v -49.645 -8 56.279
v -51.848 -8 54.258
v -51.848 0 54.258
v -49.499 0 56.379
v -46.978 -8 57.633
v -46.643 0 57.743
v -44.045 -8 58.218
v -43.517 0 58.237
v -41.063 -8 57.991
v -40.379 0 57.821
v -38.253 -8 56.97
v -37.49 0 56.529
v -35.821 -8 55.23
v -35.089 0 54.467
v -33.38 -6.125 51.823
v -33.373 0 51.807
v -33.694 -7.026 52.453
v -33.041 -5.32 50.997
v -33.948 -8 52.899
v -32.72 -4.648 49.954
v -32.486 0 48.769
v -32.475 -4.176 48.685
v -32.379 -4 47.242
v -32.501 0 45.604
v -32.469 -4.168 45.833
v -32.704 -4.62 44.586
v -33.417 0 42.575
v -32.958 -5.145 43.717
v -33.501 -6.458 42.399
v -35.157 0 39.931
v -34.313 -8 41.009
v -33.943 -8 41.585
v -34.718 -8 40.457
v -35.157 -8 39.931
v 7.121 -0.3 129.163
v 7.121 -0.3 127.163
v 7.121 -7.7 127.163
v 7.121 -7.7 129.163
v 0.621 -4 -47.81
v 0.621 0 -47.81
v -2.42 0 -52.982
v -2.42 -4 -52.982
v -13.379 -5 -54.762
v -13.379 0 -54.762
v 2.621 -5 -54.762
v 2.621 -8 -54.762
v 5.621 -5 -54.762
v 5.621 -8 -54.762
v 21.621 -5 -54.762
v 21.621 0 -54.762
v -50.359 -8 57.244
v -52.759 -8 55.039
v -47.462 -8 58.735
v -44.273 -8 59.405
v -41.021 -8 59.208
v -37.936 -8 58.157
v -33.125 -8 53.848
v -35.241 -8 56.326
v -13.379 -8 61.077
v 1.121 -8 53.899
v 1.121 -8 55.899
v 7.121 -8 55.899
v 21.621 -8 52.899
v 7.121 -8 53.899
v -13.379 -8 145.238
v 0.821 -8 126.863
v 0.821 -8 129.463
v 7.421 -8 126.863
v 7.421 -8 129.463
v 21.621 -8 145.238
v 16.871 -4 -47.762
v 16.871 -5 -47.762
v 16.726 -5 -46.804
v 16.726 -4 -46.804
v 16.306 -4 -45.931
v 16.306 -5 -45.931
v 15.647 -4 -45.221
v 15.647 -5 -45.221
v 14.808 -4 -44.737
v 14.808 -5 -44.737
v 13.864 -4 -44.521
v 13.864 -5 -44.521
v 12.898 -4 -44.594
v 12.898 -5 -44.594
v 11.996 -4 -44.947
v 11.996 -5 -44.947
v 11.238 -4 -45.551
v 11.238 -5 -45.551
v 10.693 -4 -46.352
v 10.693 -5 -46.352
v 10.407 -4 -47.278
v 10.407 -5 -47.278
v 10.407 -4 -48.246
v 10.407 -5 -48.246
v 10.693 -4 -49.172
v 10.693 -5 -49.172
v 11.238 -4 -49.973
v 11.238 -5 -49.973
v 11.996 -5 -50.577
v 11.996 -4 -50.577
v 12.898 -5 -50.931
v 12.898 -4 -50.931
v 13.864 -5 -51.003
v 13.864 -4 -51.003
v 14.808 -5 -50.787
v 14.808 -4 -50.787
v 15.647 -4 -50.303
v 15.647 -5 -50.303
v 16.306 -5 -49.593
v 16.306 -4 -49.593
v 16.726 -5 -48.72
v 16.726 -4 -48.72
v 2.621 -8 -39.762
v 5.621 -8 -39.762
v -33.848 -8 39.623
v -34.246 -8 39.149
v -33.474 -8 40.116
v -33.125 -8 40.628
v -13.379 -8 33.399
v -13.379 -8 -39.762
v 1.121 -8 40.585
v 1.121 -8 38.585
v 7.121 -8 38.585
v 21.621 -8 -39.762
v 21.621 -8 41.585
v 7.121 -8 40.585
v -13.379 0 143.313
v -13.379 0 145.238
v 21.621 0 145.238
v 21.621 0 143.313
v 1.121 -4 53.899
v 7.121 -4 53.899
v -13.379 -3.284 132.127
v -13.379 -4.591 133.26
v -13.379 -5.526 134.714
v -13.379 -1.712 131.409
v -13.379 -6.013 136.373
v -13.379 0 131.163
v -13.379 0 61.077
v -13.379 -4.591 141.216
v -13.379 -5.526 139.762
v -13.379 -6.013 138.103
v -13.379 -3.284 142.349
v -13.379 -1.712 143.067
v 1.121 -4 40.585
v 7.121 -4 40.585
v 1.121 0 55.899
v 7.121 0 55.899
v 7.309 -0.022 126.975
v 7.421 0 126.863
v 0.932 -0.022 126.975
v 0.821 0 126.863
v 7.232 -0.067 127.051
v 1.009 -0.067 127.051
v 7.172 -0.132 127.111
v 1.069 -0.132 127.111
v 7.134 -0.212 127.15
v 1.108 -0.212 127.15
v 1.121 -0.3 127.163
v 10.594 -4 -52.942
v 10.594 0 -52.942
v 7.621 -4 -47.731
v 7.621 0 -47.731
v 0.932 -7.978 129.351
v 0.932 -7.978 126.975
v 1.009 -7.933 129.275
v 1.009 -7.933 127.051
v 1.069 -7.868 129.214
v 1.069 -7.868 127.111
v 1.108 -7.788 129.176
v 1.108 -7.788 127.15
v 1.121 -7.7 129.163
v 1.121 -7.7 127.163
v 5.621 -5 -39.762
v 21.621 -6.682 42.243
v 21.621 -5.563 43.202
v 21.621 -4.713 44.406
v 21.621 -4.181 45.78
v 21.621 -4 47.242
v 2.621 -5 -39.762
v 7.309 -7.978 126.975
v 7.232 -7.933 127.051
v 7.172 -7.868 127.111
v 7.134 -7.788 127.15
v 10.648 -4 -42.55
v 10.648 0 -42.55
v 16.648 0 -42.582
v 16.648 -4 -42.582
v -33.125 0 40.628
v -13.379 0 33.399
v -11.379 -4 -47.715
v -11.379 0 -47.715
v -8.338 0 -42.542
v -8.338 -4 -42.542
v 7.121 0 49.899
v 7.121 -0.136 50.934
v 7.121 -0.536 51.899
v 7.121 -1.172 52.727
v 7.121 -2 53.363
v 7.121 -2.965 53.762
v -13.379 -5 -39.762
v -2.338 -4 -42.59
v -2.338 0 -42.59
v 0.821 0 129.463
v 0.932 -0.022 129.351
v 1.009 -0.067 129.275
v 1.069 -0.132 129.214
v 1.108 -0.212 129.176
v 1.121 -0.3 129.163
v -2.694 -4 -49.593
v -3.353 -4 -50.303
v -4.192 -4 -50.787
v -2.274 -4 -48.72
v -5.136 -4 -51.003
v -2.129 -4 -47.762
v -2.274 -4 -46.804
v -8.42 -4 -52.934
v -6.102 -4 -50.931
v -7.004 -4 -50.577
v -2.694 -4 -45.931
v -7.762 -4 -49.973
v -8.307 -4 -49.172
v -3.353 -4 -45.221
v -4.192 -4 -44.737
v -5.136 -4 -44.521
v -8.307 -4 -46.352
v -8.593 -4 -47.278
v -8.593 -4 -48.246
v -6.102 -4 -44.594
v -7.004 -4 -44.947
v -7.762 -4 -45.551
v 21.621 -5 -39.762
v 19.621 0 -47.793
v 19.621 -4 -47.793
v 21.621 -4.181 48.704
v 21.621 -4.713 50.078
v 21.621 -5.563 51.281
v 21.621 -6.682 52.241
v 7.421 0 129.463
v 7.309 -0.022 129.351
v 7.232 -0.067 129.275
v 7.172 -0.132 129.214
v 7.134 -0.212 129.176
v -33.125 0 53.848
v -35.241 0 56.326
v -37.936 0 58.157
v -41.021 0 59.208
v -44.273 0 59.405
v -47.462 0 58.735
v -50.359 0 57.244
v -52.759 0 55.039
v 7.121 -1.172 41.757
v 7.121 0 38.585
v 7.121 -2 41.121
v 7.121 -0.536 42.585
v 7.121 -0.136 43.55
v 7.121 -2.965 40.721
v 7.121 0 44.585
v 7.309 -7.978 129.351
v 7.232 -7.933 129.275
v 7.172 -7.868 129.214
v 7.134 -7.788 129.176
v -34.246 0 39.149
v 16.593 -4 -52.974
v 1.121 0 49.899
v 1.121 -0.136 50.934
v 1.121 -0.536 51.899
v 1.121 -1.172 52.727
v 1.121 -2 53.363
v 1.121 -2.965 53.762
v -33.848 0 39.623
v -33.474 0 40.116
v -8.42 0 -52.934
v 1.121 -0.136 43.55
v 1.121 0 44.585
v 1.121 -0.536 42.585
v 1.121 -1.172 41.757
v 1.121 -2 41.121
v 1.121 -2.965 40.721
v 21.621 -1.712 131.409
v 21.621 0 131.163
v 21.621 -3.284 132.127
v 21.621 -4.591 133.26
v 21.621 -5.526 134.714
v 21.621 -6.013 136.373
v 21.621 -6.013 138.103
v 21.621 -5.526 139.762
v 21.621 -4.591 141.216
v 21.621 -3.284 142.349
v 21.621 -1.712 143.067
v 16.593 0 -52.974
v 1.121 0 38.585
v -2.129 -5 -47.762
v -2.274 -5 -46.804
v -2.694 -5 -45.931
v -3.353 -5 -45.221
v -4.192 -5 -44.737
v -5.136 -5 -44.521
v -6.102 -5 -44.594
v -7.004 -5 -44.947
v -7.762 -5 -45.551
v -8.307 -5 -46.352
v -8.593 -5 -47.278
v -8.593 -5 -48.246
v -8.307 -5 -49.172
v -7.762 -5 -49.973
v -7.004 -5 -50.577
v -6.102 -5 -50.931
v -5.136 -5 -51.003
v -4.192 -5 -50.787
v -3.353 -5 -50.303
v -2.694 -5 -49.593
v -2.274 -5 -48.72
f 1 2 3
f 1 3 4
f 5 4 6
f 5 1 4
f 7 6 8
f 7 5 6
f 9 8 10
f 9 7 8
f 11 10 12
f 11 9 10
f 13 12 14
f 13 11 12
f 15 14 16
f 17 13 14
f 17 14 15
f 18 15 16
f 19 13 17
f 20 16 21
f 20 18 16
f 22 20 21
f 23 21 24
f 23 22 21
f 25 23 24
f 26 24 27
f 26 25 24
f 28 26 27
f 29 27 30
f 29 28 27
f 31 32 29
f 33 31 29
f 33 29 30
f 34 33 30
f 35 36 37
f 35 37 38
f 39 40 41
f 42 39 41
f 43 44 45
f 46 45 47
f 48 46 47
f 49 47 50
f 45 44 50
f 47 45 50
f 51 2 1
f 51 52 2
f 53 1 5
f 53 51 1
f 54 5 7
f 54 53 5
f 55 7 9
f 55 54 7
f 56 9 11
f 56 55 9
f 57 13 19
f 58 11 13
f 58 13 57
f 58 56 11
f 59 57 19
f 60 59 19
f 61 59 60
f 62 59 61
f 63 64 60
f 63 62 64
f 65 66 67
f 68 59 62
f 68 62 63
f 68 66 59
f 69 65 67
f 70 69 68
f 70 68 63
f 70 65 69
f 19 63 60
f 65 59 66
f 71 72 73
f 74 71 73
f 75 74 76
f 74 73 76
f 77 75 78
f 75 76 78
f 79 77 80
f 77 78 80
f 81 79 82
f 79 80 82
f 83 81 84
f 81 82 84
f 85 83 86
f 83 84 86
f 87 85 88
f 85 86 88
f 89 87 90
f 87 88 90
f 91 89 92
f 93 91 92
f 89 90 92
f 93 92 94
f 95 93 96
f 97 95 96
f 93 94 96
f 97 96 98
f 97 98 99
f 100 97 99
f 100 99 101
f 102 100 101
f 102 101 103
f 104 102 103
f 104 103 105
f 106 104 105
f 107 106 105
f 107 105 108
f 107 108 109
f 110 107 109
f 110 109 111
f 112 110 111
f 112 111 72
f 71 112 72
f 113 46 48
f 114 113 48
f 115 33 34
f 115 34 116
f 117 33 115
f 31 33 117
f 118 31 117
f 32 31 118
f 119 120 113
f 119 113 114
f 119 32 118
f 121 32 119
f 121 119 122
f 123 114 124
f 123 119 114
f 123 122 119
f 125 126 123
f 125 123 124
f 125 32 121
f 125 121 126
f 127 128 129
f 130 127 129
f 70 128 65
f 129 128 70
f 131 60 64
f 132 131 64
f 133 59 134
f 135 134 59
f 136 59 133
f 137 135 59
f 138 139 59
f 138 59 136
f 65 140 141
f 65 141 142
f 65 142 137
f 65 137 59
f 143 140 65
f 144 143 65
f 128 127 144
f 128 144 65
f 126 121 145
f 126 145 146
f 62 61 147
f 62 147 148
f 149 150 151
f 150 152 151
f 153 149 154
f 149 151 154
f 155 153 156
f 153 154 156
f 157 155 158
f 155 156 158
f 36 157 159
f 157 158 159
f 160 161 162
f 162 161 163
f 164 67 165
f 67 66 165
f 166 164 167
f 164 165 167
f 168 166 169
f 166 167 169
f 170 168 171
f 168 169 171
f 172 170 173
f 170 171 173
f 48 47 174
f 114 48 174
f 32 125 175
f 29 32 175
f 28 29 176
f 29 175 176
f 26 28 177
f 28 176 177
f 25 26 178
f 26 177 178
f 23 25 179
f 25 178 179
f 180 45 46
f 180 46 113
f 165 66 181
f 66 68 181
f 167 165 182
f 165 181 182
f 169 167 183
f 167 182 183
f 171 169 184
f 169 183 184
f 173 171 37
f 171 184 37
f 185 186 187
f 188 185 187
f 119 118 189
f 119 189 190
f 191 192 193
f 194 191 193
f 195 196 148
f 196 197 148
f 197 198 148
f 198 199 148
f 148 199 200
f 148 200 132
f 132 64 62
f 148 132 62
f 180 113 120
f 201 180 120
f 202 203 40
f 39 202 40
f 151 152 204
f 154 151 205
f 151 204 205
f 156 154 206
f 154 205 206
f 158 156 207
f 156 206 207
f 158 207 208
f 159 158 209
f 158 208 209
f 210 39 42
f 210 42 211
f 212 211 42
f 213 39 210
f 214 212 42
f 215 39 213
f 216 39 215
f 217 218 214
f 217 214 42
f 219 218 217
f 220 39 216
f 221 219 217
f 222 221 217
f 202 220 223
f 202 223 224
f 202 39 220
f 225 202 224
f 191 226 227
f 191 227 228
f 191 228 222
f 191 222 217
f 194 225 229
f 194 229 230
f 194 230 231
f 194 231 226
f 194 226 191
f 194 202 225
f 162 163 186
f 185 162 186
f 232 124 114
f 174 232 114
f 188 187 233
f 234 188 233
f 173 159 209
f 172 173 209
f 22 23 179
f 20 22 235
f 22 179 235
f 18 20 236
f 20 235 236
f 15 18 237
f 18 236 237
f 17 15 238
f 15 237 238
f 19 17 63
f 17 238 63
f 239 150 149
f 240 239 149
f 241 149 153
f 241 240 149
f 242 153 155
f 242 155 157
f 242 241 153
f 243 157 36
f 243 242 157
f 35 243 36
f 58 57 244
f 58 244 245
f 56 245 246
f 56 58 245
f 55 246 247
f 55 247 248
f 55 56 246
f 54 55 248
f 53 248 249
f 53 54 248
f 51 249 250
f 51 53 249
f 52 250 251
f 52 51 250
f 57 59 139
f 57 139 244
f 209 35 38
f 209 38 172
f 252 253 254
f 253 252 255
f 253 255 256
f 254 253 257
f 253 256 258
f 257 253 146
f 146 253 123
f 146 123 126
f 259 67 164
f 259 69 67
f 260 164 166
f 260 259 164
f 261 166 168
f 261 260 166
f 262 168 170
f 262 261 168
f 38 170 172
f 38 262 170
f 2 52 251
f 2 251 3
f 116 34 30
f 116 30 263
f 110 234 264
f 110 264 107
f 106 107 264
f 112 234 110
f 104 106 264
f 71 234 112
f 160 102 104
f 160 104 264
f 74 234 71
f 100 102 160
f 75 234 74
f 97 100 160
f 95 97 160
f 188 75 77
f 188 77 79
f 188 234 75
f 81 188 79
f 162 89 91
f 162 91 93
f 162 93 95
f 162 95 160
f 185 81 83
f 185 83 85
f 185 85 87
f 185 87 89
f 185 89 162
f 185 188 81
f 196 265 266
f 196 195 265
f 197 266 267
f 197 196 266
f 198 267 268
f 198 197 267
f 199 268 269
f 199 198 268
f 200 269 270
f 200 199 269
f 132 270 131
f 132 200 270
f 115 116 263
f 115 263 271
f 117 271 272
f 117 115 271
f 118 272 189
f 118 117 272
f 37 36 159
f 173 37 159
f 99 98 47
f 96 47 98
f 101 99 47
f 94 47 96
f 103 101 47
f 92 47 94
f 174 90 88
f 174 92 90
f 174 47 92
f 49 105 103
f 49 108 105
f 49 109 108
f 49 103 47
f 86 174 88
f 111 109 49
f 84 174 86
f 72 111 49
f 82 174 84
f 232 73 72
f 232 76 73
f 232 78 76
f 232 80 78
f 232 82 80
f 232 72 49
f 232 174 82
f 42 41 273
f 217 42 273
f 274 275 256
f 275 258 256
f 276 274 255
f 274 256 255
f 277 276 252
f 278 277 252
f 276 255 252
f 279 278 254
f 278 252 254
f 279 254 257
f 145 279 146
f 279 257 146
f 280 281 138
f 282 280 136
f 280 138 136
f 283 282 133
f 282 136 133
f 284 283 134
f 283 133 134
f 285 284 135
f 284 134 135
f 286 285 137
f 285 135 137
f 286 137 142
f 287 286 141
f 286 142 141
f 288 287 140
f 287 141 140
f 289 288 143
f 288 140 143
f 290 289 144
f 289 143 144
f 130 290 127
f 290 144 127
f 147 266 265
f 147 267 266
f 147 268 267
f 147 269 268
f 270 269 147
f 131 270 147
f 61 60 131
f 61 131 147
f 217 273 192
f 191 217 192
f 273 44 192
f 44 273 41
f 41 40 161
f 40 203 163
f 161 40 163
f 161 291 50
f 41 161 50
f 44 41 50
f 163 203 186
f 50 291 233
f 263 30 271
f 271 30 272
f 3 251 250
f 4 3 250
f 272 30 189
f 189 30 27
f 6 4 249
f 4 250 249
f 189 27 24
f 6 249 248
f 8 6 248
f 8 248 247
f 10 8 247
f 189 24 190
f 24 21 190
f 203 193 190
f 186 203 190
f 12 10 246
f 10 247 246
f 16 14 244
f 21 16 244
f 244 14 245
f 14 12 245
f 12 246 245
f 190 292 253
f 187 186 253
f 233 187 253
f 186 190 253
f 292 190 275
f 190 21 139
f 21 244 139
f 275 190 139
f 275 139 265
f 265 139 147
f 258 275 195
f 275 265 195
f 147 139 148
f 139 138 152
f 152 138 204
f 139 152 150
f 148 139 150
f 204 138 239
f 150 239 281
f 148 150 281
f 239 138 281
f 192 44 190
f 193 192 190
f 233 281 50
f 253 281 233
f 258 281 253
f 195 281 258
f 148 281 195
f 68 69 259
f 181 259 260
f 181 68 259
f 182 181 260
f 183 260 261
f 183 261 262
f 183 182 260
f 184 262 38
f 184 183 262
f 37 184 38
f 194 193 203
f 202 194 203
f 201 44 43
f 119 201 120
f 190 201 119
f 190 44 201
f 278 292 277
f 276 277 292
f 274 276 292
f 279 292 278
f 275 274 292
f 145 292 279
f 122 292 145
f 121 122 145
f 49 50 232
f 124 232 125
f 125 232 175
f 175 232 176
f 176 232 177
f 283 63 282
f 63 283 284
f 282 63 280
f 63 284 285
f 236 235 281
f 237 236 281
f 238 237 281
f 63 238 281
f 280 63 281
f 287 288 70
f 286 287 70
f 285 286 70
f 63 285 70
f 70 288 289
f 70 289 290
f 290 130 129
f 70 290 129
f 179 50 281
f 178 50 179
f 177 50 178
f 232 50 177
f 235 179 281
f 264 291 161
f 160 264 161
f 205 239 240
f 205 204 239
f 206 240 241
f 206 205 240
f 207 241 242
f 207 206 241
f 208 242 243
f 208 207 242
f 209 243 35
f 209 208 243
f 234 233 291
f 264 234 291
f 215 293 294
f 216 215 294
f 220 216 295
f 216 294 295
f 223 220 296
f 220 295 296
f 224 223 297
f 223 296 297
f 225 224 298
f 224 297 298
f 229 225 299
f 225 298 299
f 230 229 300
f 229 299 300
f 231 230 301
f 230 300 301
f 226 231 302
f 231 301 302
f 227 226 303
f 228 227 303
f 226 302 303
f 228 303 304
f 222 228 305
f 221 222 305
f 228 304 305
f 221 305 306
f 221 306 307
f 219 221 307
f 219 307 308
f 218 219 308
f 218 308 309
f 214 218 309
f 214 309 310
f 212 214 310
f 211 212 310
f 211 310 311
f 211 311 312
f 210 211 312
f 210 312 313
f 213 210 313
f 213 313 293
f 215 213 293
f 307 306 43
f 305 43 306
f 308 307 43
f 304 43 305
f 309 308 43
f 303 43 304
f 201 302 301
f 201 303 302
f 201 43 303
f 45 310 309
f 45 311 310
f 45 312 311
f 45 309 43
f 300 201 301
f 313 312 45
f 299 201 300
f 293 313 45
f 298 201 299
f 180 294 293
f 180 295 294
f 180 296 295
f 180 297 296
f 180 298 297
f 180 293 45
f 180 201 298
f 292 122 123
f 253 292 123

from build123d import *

# Parameters (mm, degrees)
F0_W      = 35
F0_H      = 200
F1_DEPTH  = 8
F2_R      = 6.075
F3_DEPTH  = 45
F4_W      = 6
F4_H      = 2
F6_DEPTH  = 25
F7_R      = 0.3
F8_R      = 3.25
F9_DEPTH  = 25
F10_R     = 3.25
F11_DEPTH = 4
F12_R     = 3.25
F13_DEPTH = 3
F14_W     = 3
F14_H     = 15
F15_DEPTH = 3
F18_DEPTH = 8
F20_DEPTH = 65
F21_W     = 6
F21_H     = 2
F22_DEPTH = 25
F23_R     = 4


with BuildPart() as f1:
    # F0 (on Front) → F1 (new body)
    with BuildSketch(Plane.XZ):
        with Locations((4.1207429767, 45.2379755676)):
            Rectangle(F0_W, F0_H)
    extrude(amount=F1_DEPTH)

    # F2 (on face) → F3 (cut)
    with BuildSketch(Plane(origin=(-13.3792570233, 0, 0), x_dir=(0, -1, 0), z_dir=(-1, 0, 0))):
        with Locations((0, 137.2379755676)):
            Circle(F2_R)
    extrude(amount=-F3_DEPTH, mode=Mode.SUBTRACT)

    # F4 (on face) → F6 (cut)
    with BuildSketch(Plane(origin=(0, 0, 0), x_dir=(-1, 0, 0), z_dir=(0, 1, 0))):
        with Locations((-4.1207429767, 128.1629755676)):
            Rectangle(F4_W, F4_H)
    extrude(amount=-F6_DEPTH, mode=Mode.SUBTRACT)

    # F7
    f7_edges = [f1.edges().sort_by_distance(p)[0] for p in [
        (4.120743, -8, 129.162976),
        (4.120743, -8, 127.162976),
        (7.120743, -8, 128.162976),
        (1.120743, -8, 128.162976),
        (4.120743, 0, 129.162976),
        (7.120743, 0, 128.162976),
        (4.120743, 0, 127.162976),
        (1.120743, 0, 128.162976),
    ]]
    fillet(f7_edges, radius=F7_R)

    # F8 (on face) → F9 (cut)
    with BuildSketch(Plane.XZ.offset(8)):
        with Locations((-5.3792570233, -47.7620244324)):
            Circle(F8_R)
        with Locations((13.6207429767, -47.7620244324)):
            Circle(F8_R)
    extrude(amount=-F9_DEPTH, mode=Mode.SUBTRACT)

    # F10 (on face) → F11 (cut)
    with BuildSketch(Plane(origin=(0, 0, 0), x_dir=(-1, 0, 0), z_dir=(0, 1, 0))):
        Polygon((-10.593553136, -52.9423836544), (-7.6208253694, -47.7305807393), (-10.64801521, -42.5502215174), (-16.6479328173, -42.5816652105), (-19.6206605839, -47.7934681255), (-16.5934707433, -52.9738273475), align=None)
        with Locations((-13.6207429767, -47.7620244324)):
            Circle(F10_R, mode=Mode.SUBTRACT)
        Polygon((8.4202988823, -52.9342642192), (11.3790690026, -47.7145248219), (8.3380271436, -42.5422850352), (2.3382151643, -42.5897846457), (-0.620554956, -47.8095240429), (2.420486903, -52.9817638297), align=None)
        with Locations((5.3792570233, -47.7620244324)):
            Circle(F10_R, mode=Mode.SUBTRACT)
    extrude(amount=-F11_DEPTH, mode=Mode.SUBTRACT)

    # F12 (on face) → F13 (cut)
    with BuildSketch(Plane.XZ.offset(8)):
        Polygon((-13.3792570233, -40.5933335423), (-13.3792570233, -54.7620244324), (21.6207429767, -54.7620244324), (21.6207429767, -40.5933335423), (21.6207429767, -39.7620244324), (-13.3792570233, -39.7620244324), align=None)
        with Locations((-5.3792570233, -47.7620244324)):
            Circle(F12_R, mode=Mode.SUBTRACT)
        with Locations((13.6207429767, -47.7620244324)):
            Circle(F12_R, mode=Mode.SUBTRACT)
        Polygon((-13.3792570233, -40.5933335423), (-13.3792570233, -54.7620244324), (21.6207429767, -54.7620244324), (21.6207429767, -40.5933335423), (21.6207429767, -39.7620244324), (-13.3792570233, -39.7620244324), align=None)
    extrude(amount=-F13_DEPTH, mode=Mode.SUBTRACT)

    # F14 (on face) → F15 (join)
    with BuildSketch(Plane.XZ.offset(5)):
        with Locations((4.1207429767, -47.2620244324)):
            Rectangle(F14_W, F14_H)
    extrude(amount=F15_DEPTH)

    # F16 (on face) → F18 (join)
    with BuildSketch(Plane.XZ.offset(8)):
        with BuildLine():
            Line((-35.1568526326, 39.9309880875), (-34.2461589726, 39.1493094232))
            ThreePointArc((-34.2461589726, 39.1493094232), (-33.657494289, 39.8672680482), (-33.1251321385, 40.6279133253))
            Line((-33.1251321385, 40.6279133253), (-13.3792570233, 33.3985724449))
            Line((-13.3792570233, 33.3985724449), (-13.3792570233, 61.0773786902))
            Line((-13.3792570233, 61.0773786902), (-33.1251321385, 53.8480378099))
            ThreePointArc((-33.1251321385, 53.8480378099), (-42.6403240796, 59.4155770599), (-52.7588970229, 55.0394083513))
            Line((-52.7588970229, 55.0394083513), (-51.8482033629, 54.257729687))
            ThreePointArc((-51.8482033629, 54.257729687), (-36.2148256468, 55.5848865562), (-35.1568526326, 39.9309880875))
        make_face()
    extrude(amount=-F18_DEPTH)

    # F19 (on face) → F20 (cut)
    with BuildSketch(Plane.YZ.offset(21.6207429767)):
        with BuildLine():
            ThreePointArc((-8, 41.585023515), (-5.1010205144, 43.7777761493), (-4, 47.2418777645))
            ThreePointArc((-4, 47.2418777645), (-5.1010205144, 50.7059793796), (-8, 52.898732014))
            Line((-8, 52.898732014), (-8, 41.585023515))
        make_face()
    extrude(amount=-F20_DEPTH, mode=Mode.SUBTRACT)

    # F21 (on face) → F22 (cut)
    with BuildSketch(Plane.XZ.offset(8)):
        with Locations((4.1207429767, 39.585023515)):
            Rectangle(F21_W, F21_H)
        with Locations((4.1207429767, 54.898732014)):
            Rectangle(F21_W, F21_H)
    extrude(amount=-F22_DEPTH, mode=Mode.SUBTRACT)

    # F23
    f23_edges = [f1.edges().sort_by_distance(p)[0] for p in [
        (4.120743, 0, 40.585024),
        (4.120743, 0, 53.898732),
    ]]
    fillet(f23_edges, radius=F23_R)


solid = f1.part
